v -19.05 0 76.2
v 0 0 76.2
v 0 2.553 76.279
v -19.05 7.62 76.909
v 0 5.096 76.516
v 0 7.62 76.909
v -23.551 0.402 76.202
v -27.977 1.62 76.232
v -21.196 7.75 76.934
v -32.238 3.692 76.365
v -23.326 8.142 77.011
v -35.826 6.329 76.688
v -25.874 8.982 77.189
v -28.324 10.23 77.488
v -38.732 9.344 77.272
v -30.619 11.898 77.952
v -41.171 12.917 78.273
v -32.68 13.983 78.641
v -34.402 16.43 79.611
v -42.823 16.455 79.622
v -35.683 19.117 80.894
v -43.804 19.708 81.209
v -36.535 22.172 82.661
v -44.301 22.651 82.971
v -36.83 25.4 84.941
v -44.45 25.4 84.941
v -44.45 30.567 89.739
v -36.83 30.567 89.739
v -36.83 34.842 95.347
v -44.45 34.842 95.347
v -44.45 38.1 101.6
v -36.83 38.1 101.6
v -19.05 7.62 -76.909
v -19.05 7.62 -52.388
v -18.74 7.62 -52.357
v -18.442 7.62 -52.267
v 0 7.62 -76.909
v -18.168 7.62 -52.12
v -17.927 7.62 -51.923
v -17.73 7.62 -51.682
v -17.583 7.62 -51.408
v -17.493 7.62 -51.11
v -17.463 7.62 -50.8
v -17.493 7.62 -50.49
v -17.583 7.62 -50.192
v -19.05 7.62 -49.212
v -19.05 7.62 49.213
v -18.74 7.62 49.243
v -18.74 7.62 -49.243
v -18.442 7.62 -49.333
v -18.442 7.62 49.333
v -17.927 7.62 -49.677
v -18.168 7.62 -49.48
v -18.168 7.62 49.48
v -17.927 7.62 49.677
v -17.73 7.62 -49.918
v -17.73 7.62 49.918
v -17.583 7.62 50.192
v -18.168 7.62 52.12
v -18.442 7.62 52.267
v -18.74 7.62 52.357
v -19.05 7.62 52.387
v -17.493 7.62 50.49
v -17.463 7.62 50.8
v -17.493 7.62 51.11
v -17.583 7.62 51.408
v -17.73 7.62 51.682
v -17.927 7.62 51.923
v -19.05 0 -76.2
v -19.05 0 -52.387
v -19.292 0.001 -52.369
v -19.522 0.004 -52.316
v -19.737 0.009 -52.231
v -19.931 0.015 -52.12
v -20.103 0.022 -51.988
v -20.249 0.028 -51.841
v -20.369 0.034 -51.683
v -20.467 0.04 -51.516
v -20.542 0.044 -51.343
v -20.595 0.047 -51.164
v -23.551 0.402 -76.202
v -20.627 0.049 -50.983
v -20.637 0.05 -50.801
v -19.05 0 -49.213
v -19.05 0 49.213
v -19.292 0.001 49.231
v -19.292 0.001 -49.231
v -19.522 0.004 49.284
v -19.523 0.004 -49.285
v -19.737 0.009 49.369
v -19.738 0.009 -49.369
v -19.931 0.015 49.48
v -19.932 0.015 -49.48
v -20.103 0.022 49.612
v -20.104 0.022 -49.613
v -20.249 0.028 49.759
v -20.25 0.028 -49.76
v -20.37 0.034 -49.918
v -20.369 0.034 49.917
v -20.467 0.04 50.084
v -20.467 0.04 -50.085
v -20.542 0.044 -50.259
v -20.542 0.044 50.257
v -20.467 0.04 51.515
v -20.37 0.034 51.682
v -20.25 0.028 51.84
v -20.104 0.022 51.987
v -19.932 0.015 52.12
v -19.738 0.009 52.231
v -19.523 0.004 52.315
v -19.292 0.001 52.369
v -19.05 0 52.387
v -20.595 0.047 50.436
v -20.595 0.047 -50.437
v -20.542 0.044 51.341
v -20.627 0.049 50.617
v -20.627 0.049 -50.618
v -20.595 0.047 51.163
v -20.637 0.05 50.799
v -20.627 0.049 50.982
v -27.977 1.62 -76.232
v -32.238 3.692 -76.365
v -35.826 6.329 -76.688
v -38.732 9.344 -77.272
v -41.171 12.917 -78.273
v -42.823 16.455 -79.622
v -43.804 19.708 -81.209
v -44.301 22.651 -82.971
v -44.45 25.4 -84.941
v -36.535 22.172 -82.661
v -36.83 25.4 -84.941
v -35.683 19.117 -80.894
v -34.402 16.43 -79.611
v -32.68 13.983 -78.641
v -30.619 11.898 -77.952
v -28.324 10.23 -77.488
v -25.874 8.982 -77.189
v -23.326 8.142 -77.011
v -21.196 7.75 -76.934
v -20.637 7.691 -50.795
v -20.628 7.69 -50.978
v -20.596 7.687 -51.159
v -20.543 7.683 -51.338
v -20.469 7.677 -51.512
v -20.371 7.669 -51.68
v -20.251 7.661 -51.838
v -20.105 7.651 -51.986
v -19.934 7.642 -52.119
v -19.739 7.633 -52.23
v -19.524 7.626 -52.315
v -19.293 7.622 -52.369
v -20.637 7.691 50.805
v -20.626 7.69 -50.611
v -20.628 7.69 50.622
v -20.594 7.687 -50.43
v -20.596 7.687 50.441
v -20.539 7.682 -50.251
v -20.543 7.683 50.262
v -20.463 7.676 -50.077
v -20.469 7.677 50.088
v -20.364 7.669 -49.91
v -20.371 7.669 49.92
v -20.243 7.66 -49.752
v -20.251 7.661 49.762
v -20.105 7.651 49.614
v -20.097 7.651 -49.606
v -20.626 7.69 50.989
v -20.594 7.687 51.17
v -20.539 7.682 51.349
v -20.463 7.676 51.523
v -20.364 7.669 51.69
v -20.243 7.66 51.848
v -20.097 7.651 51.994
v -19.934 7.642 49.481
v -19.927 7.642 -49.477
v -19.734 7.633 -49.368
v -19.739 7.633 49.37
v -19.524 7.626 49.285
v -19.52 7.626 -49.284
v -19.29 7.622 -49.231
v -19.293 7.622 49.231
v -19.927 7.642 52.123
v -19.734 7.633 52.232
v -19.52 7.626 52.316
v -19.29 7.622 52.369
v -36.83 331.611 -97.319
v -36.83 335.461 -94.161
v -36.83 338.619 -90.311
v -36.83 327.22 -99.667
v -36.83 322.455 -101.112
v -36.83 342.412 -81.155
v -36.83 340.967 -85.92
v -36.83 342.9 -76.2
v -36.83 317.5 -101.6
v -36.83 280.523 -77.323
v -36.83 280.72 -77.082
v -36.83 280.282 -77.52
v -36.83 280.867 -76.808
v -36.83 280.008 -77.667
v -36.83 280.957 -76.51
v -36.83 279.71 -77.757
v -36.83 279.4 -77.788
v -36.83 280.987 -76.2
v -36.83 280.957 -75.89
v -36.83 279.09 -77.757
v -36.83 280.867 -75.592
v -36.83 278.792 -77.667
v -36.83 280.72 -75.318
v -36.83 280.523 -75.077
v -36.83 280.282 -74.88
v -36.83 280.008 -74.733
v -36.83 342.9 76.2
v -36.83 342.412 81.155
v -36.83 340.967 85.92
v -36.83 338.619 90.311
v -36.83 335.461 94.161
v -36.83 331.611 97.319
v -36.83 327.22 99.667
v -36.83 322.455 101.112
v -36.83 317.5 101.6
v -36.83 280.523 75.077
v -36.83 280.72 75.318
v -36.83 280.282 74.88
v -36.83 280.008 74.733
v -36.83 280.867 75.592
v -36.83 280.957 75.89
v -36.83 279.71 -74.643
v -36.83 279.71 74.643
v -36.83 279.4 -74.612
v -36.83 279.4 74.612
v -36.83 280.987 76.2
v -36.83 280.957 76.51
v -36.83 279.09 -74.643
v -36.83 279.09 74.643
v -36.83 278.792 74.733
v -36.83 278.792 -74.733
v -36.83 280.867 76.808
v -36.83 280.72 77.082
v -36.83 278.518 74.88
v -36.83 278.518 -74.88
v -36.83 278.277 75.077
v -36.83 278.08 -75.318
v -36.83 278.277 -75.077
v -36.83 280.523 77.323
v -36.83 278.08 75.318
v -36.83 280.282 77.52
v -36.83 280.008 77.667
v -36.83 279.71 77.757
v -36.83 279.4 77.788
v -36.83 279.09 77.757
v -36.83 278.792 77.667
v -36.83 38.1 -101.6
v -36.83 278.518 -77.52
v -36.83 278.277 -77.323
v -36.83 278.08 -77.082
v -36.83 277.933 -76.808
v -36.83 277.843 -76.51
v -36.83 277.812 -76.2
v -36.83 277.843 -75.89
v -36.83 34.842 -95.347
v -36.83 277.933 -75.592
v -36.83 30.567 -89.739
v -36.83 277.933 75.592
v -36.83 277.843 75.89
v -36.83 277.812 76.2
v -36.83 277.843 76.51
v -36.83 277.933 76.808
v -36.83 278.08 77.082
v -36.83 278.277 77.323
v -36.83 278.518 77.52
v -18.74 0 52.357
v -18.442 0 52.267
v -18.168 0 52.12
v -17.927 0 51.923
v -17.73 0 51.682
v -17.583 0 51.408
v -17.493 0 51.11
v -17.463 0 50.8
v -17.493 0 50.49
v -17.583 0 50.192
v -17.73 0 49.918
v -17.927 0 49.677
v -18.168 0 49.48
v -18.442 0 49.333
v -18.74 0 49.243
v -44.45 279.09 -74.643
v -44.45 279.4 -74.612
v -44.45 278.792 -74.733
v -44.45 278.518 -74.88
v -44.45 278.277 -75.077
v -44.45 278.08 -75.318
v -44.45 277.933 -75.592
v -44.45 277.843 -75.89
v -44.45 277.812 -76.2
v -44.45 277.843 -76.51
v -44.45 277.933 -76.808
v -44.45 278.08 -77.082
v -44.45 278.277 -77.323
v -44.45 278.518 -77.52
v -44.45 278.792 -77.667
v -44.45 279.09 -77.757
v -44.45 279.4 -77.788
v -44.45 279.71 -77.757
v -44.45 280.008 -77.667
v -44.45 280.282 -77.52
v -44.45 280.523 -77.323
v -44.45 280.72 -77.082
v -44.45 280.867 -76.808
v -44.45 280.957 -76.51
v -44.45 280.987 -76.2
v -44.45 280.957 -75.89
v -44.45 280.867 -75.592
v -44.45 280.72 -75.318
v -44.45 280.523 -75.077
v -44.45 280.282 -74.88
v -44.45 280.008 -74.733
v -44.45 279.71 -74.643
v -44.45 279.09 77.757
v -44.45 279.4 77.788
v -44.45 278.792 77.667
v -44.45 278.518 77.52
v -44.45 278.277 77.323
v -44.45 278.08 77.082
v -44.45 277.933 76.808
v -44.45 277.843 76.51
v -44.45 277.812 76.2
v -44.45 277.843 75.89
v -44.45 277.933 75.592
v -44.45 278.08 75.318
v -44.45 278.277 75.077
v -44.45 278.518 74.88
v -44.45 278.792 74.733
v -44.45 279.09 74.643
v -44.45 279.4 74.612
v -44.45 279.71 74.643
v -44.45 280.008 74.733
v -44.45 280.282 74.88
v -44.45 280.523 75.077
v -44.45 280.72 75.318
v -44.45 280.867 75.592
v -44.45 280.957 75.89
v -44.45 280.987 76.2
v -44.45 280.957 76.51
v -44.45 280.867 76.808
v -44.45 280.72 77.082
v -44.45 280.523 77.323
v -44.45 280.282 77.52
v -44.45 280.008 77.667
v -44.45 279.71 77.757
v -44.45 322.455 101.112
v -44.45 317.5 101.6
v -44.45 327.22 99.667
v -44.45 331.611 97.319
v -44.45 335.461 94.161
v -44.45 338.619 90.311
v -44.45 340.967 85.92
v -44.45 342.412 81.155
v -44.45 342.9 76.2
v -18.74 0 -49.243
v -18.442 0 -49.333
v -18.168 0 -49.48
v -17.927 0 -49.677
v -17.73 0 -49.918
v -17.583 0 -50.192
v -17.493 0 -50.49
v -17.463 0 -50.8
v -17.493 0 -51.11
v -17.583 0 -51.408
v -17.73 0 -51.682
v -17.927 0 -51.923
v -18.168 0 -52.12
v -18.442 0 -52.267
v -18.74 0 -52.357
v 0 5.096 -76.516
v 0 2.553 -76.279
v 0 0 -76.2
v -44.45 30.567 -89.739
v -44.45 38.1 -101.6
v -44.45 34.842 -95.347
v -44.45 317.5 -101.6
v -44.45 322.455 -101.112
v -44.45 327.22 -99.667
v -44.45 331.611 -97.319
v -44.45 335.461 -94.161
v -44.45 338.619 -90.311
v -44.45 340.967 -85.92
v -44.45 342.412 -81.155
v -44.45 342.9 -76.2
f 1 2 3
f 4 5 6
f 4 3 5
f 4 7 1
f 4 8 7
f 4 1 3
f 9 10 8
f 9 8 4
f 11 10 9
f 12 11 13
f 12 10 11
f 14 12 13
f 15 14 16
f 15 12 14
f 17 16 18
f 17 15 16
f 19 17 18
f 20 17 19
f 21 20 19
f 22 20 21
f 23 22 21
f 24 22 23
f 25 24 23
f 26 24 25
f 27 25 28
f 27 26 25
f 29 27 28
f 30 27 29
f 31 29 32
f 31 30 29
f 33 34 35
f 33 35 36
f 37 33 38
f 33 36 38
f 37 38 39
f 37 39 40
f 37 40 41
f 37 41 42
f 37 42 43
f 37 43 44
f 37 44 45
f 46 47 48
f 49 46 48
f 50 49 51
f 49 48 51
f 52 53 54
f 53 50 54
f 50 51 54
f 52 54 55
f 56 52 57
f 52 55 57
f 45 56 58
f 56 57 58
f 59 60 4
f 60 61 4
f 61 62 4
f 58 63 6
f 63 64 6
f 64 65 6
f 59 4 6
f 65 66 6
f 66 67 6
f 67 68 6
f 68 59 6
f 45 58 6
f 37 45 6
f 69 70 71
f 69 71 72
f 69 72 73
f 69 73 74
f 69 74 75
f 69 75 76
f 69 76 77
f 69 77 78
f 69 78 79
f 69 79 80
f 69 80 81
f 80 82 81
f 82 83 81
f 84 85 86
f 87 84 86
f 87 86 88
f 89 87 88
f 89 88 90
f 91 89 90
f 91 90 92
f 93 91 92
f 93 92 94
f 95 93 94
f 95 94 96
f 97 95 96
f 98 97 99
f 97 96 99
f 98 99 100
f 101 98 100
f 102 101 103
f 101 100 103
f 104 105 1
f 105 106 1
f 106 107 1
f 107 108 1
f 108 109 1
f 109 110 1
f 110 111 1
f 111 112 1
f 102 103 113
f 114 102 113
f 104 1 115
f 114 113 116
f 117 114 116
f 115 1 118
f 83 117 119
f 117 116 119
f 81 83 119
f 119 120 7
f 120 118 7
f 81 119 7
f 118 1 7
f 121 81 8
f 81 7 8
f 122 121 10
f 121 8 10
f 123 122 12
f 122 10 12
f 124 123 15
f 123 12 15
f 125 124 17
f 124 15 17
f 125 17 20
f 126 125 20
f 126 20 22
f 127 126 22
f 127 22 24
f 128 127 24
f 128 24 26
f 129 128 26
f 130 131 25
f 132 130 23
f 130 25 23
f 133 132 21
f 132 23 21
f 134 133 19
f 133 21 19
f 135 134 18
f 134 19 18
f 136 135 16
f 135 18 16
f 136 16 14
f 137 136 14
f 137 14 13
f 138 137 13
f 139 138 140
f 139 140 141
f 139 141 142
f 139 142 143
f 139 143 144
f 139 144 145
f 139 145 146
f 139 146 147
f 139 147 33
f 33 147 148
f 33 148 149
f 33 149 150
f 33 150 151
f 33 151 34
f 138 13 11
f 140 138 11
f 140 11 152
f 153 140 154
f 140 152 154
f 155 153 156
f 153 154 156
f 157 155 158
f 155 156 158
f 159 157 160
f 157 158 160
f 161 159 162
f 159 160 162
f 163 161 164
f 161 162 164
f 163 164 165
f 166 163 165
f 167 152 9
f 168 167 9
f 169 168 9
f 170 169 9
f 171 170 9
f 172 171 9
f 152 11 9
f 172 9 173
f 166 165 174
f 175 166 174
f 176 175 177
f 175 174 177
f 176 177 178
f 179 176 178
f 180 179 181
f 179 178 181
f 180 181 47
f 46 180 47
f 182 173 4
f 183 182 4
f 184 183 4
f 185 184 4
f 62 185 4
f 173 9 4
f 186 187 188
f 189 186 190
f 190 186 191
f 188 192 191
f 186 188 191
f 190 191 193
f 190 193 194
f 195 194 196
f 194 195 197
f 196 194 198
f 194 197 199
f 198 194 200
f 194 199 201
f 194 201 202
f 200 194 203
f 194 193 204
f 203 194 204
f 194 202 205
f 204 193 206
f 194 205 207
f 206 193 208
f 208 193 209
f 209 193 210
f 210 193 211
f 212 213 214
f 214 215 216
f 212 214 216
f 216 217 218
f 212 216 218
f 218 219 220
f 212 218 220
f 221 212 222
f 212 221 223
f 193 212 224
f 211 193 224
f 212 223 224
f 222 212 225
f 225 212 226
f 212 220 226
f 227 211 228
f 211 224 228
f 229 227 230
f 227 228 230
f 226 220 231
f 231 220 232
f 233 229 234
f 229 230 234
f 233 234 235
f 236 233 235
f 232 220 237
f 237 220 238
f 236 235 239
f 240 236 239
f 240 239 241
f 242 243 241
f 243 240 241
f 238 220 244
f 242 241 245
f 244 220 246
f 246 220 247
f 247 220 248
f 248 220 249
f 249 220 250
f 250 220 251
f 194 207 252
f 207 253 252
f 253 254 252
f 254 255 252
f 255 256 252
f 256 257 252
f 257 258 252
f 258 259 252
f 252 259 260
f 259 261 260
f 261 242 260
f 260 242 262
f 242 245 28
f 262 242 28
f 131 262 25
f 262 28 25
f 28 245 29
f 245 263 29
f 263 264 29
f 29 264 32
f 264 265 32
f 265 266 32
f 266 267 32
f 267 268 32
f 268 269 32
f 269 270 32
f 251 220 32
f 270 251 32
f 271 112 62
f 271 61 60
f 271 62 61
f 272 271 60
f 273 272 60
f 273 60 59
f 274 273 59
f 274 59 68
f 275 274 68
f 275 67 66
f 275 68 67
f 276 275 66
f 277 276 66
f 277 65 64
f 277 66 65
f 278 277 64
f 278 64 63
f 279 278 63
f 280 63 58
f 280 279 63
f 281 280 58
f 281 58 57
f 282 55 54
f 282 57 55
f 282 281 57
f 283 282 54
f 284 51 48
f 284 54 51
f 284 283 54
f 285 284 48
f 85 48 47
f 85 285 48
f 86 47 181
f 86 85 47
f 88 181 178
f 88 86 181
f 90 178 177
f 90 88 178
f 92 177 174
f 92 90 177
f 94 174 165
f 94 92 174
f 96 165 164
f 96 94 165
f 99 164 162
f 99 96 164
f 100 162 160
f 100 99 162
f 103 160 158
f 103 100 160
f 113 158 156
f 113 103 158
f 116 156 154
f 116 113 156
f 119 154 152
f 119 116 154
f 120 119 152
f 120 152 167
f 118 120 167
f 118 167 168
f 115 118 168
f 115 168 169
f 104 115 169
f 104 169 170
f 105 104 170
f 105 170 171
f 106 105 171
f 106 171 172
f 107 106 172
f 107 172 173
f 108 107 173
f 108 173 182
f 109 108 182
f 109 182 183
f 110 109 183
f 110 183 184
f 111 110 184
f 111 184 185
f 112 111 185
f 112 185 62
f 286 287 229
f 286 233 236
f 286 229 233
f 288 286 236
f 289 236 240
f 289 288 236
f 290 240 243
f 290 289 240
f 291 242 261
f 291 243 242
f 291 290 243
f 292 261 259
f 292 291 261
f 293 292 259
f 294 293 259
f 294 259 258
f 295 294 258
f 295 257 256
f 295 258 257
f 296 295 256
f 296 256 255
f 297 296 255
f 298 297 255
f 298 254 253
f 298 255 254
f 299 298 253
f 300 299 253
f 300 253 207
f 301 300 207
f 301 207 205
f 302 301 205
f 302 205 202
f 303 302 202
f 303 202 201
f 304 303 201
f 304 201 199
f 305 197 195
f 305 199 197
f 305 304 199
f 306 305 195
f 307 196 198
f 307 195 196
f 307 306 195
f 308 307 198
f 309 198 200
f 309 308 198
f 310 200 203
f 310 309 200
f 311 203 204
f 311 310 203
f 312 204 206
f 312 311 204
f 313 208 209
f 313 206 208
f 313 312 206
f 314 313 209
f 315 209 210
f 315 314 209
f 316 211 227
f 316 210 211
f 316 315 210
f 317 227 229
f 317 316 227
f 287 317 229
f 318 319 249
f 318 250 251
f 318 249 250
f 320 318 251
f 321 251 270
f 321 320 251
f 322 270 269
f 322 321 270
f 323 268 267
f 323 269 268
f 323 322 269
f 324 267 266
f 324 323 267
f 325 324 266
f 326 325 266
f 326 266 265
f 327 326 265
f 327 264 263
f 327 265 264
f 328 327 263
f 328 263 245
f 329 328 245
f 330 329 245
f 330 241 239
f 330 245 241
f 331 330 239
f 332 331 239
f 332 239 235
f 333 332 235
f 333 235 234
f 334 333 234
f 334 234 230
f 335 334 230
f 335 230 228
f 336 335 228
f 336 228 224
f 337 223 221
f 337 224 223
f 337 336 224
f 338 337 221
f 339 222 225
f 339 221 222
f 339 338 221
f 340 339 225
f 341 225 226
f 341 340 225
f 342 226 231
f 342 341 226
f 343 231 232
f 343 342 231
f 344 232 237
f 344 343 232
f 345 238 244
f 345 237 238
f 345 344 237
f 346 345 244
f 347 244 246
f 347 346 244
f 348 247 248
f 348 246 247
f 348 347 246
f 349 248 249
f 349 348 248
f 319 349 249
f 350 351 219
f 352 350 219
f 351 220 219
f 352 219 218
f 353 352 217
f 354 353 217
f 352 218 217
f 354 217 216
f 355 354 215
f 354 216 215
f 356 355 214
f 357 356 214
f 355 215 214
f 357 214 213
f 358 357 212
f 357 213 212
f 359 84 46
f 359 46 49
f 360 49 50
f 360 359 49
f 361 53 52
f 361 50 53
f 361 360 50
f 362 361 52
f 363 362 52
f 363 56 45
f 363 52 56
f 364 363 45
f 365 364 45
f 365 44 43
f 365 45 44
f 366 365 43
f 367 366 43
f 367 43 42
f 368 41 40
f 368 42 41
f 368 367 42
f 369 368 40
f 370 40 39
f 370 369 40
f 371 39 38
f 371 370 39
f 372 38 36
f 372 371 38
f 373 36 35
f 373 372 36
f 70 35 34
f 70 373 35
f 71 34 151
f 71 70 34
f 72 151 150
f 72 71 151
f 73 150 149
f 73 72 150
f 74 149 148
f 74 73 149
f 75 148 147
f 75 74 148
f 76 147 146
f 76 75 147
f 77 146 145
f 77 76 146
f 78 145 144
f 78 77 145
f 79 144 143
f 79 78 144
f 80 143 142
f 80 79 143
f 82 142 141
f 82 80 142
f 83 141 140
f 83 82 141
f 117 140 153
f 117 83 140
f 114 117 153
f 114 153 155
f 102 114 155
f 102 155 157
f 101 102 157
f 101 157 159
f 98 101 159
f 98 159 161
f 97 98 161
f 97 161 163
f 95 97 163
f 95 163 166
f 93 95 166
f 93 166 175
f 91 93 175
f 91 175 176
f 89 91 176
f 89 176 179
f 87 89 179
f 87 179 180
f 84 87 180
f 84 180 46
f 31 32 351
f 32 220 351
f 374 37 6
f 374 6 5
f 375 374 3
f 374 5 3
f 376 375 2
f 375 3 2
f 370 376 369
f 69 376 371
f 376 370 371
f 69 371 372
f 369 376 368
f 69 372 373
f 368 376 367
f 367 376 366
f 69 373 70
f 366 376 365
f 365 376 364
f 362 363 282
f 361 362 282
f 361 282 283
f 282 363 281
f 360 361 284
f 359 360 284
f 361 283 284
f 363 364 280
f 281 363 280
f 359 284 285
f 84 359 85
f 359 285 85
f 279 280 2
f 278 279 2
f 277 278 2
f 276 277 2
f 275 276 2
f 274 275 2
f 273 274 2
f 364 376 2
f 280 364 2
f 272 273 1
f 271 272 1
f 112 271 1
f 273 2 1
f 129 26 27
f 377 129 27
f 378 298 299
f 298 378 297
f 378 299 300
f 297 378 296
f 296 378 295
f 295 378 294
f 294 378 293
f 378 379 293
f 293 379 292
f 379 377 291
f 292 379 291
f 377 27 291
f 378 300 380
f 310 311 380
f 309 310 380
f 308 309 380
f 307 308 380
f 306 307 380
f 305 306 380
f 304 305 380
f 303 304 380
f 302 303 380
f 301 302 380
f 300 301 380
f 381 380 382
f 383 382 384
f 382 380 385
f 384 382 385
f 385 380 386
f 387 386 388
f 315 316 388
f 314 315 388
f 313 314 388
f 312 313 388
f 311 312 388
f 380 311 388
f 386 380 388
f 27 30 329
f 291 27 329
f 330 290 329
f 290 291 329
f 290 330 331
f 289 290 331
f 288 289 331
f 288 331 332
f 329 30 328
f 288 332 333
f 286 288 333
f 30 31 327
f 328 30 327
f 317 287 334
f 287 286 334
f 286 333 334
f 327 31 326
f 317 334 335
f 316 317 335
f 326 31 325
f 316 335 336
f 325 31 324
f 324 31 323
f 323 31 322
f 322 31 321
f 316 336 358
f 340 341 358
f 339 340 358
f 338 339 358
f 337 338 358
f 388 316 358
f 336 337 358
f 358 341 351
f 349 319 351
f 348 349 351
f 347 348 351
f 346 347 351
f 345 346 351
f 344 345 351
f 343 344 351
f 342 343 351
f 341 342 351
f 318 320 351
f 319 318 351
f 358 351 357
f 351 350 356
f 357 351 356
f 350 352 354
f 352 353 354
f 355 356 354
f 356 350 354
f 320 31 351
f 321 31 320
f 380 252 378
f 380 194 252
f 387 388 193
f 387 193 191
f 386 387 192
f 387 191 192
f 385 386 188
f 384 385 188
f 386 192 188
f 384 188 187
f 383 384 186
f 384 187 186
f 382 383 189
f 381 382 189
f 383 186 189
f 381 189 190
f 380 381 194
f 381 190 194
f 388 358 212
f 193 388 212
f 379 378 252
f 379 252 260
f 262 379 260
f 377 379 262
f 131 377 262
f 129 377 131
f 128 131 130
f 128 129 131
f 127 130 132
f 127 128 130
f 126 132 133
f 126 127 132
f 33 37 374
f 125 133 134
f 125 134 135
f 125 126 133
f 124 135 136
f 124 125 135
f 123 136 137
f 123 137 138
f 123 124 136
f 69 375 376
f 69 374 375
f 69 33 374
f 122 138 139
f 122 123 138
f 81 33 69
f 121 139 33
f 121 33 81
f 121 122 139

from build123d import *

# Parameters (mm, degrees)
EXTRUDE_THIN1_DEPTH     = 101.6
FILLET1_R               = 25.4
FILLET2_R               = 25.4
CUT_EXTRUDE1_DEPTH      = 15.494
CUT_EXTRUDE1_DEPTH_BACK = 67.818
CUT_EXTRUDE2_DEPTH      = 20.32
CUT_EXTRUDE2_DEPTH_BACK = 16.51
SKETCH3_R               = 1.5875
CUT_EXTRUDE3_DEPTH      = 14.732
CUT_EXTRUDE3_DEPTH_BACK = 22.86
SKETCH4_R               = 1.5875


with BuildPart() as part:
    # Sketch1 → Extrude-Thin1 (new, symmetric)
    with BuildSketch(Plane.XY):
        with BuildLine():
            Line((0, 0), (-19.05, 0))
            ThreePointArc((-19.05, 0), (-37.010512242, 7.439487758), (-44.45, 25.4))
            Line((-44.45, 25.4), (-44.45, 342.9))
            Line((-44.45, 342.9), (-36.83, 342.9))
            Line((-36.83, 342.9), (-36.83, 25.4))
            ThreePointArc((-36.83, 25.4), (-31.622358569, 12.827641431), (-19.05, 7.62))
            Line((-19.05, 7.62), (0, 7.62))
            Line((0, 7.62), (0, 0))
        make_face()
    extrude(amount=EXTRUDE_THIN1_DEPTH, both=True)

    # Fillet1
    fillet1_edges = [part.edges().sort_by_distance(p)[0] for p in [
        (-40.64, 342.9, 101.6),
    ]]
    fillet(fillet1_edges, radius=FILLET1_R)

    # Fillet2
    fillet2_edges = [part.edges().sort_by_distance(p)[0] for p in [
        (-40.64, 342.9, -101.6),
    ]]
    fillet(fillet2_edges, radius=FILLET2_R)

    # Sketch2 → Cut-Extrude1 (cut, two sides: drawn at the far end of the back side and taken through both)
    with BuildSketch(Plane(origin=(0, 0, 0), x_dir=(0, 0, -1), z_dir=(1, 0, 0)).offset(-CUT_EXTRUDE1_DEPTH_BACK)):
        with BuildLine():
            Line((-101.6, 0), (-76.2, 0))
            ThreePointArc((-76.2, 0), (-83.132124101, 22.895250599), (-101.6, 38.1))
            Line((-101.6, 38.1), (-101.6, 0))
        make_face()
        with BuildLine():
            Line((101.6, 0), (101.6, 38.1))
            ThreePointArc((101.6, 38.1), (83.132124101, 22.895250599), (76.2, 0))
            Line((76.2, 0), (101.6, 0))
        make_face()
    extrude(amount=CUT_EXTRUDE1_DEPTH + CUT_EXTRUDE1_DEPTH_BACK, mode=Mode.SUBTRACT)

    # Sketch3 → Cut-Extrude2 (cut, two sides: drawn at the far end of the back side and taken through both)
    with BuildSketch(Plane(origin=(-36.83, 0, 0), x_dir=(0, 0, -1), z_dir=(1, 0, 0)).offset(-CUT_EXTRUDE2_DEPTH_BACK)):
        with Locations(Location((-76.2, 279.4, 0), (0, 0, 180))):
            Circle(SKETCH3_R)
        with Locations(Location((76.2, 279.4, 0), (0, 0, 180))):
            Circle(SKETCH3_R)
    extrude(amount=CUT_EXTRUDE2_DEPTH + CUT_EXTRUDE2_DEPTH_BACK, mode=Mode.SUBTRACT)

    # Sketch4 → Cut-Extrude3 (cut, two sides: drawn at the far end of the back side and taken through both)
    with BuildSketch(Plane(origin=(0, 7.62, 0), x_dir=(1, 0, 0), z_dir=(0, 1, 0)).offset(-CUT_EXTRUDE3_DEPTH_BACK)):
        with Locations(Location((-19.05, -50.8, 0), (0, 0, 270))):
            Circle(SKETCH4_R)
        with Locations(Location((-19.05, 50.8, 0), (0, 0, 270))):
            Circle(SKETCH4_R)
    extrude(amount=CUT_EXTRUDE3_DEPTH + CUT_EXTRUDE3_DEPTH_BACK, mode=Mode.SUBTRACT)


solid = part.part
